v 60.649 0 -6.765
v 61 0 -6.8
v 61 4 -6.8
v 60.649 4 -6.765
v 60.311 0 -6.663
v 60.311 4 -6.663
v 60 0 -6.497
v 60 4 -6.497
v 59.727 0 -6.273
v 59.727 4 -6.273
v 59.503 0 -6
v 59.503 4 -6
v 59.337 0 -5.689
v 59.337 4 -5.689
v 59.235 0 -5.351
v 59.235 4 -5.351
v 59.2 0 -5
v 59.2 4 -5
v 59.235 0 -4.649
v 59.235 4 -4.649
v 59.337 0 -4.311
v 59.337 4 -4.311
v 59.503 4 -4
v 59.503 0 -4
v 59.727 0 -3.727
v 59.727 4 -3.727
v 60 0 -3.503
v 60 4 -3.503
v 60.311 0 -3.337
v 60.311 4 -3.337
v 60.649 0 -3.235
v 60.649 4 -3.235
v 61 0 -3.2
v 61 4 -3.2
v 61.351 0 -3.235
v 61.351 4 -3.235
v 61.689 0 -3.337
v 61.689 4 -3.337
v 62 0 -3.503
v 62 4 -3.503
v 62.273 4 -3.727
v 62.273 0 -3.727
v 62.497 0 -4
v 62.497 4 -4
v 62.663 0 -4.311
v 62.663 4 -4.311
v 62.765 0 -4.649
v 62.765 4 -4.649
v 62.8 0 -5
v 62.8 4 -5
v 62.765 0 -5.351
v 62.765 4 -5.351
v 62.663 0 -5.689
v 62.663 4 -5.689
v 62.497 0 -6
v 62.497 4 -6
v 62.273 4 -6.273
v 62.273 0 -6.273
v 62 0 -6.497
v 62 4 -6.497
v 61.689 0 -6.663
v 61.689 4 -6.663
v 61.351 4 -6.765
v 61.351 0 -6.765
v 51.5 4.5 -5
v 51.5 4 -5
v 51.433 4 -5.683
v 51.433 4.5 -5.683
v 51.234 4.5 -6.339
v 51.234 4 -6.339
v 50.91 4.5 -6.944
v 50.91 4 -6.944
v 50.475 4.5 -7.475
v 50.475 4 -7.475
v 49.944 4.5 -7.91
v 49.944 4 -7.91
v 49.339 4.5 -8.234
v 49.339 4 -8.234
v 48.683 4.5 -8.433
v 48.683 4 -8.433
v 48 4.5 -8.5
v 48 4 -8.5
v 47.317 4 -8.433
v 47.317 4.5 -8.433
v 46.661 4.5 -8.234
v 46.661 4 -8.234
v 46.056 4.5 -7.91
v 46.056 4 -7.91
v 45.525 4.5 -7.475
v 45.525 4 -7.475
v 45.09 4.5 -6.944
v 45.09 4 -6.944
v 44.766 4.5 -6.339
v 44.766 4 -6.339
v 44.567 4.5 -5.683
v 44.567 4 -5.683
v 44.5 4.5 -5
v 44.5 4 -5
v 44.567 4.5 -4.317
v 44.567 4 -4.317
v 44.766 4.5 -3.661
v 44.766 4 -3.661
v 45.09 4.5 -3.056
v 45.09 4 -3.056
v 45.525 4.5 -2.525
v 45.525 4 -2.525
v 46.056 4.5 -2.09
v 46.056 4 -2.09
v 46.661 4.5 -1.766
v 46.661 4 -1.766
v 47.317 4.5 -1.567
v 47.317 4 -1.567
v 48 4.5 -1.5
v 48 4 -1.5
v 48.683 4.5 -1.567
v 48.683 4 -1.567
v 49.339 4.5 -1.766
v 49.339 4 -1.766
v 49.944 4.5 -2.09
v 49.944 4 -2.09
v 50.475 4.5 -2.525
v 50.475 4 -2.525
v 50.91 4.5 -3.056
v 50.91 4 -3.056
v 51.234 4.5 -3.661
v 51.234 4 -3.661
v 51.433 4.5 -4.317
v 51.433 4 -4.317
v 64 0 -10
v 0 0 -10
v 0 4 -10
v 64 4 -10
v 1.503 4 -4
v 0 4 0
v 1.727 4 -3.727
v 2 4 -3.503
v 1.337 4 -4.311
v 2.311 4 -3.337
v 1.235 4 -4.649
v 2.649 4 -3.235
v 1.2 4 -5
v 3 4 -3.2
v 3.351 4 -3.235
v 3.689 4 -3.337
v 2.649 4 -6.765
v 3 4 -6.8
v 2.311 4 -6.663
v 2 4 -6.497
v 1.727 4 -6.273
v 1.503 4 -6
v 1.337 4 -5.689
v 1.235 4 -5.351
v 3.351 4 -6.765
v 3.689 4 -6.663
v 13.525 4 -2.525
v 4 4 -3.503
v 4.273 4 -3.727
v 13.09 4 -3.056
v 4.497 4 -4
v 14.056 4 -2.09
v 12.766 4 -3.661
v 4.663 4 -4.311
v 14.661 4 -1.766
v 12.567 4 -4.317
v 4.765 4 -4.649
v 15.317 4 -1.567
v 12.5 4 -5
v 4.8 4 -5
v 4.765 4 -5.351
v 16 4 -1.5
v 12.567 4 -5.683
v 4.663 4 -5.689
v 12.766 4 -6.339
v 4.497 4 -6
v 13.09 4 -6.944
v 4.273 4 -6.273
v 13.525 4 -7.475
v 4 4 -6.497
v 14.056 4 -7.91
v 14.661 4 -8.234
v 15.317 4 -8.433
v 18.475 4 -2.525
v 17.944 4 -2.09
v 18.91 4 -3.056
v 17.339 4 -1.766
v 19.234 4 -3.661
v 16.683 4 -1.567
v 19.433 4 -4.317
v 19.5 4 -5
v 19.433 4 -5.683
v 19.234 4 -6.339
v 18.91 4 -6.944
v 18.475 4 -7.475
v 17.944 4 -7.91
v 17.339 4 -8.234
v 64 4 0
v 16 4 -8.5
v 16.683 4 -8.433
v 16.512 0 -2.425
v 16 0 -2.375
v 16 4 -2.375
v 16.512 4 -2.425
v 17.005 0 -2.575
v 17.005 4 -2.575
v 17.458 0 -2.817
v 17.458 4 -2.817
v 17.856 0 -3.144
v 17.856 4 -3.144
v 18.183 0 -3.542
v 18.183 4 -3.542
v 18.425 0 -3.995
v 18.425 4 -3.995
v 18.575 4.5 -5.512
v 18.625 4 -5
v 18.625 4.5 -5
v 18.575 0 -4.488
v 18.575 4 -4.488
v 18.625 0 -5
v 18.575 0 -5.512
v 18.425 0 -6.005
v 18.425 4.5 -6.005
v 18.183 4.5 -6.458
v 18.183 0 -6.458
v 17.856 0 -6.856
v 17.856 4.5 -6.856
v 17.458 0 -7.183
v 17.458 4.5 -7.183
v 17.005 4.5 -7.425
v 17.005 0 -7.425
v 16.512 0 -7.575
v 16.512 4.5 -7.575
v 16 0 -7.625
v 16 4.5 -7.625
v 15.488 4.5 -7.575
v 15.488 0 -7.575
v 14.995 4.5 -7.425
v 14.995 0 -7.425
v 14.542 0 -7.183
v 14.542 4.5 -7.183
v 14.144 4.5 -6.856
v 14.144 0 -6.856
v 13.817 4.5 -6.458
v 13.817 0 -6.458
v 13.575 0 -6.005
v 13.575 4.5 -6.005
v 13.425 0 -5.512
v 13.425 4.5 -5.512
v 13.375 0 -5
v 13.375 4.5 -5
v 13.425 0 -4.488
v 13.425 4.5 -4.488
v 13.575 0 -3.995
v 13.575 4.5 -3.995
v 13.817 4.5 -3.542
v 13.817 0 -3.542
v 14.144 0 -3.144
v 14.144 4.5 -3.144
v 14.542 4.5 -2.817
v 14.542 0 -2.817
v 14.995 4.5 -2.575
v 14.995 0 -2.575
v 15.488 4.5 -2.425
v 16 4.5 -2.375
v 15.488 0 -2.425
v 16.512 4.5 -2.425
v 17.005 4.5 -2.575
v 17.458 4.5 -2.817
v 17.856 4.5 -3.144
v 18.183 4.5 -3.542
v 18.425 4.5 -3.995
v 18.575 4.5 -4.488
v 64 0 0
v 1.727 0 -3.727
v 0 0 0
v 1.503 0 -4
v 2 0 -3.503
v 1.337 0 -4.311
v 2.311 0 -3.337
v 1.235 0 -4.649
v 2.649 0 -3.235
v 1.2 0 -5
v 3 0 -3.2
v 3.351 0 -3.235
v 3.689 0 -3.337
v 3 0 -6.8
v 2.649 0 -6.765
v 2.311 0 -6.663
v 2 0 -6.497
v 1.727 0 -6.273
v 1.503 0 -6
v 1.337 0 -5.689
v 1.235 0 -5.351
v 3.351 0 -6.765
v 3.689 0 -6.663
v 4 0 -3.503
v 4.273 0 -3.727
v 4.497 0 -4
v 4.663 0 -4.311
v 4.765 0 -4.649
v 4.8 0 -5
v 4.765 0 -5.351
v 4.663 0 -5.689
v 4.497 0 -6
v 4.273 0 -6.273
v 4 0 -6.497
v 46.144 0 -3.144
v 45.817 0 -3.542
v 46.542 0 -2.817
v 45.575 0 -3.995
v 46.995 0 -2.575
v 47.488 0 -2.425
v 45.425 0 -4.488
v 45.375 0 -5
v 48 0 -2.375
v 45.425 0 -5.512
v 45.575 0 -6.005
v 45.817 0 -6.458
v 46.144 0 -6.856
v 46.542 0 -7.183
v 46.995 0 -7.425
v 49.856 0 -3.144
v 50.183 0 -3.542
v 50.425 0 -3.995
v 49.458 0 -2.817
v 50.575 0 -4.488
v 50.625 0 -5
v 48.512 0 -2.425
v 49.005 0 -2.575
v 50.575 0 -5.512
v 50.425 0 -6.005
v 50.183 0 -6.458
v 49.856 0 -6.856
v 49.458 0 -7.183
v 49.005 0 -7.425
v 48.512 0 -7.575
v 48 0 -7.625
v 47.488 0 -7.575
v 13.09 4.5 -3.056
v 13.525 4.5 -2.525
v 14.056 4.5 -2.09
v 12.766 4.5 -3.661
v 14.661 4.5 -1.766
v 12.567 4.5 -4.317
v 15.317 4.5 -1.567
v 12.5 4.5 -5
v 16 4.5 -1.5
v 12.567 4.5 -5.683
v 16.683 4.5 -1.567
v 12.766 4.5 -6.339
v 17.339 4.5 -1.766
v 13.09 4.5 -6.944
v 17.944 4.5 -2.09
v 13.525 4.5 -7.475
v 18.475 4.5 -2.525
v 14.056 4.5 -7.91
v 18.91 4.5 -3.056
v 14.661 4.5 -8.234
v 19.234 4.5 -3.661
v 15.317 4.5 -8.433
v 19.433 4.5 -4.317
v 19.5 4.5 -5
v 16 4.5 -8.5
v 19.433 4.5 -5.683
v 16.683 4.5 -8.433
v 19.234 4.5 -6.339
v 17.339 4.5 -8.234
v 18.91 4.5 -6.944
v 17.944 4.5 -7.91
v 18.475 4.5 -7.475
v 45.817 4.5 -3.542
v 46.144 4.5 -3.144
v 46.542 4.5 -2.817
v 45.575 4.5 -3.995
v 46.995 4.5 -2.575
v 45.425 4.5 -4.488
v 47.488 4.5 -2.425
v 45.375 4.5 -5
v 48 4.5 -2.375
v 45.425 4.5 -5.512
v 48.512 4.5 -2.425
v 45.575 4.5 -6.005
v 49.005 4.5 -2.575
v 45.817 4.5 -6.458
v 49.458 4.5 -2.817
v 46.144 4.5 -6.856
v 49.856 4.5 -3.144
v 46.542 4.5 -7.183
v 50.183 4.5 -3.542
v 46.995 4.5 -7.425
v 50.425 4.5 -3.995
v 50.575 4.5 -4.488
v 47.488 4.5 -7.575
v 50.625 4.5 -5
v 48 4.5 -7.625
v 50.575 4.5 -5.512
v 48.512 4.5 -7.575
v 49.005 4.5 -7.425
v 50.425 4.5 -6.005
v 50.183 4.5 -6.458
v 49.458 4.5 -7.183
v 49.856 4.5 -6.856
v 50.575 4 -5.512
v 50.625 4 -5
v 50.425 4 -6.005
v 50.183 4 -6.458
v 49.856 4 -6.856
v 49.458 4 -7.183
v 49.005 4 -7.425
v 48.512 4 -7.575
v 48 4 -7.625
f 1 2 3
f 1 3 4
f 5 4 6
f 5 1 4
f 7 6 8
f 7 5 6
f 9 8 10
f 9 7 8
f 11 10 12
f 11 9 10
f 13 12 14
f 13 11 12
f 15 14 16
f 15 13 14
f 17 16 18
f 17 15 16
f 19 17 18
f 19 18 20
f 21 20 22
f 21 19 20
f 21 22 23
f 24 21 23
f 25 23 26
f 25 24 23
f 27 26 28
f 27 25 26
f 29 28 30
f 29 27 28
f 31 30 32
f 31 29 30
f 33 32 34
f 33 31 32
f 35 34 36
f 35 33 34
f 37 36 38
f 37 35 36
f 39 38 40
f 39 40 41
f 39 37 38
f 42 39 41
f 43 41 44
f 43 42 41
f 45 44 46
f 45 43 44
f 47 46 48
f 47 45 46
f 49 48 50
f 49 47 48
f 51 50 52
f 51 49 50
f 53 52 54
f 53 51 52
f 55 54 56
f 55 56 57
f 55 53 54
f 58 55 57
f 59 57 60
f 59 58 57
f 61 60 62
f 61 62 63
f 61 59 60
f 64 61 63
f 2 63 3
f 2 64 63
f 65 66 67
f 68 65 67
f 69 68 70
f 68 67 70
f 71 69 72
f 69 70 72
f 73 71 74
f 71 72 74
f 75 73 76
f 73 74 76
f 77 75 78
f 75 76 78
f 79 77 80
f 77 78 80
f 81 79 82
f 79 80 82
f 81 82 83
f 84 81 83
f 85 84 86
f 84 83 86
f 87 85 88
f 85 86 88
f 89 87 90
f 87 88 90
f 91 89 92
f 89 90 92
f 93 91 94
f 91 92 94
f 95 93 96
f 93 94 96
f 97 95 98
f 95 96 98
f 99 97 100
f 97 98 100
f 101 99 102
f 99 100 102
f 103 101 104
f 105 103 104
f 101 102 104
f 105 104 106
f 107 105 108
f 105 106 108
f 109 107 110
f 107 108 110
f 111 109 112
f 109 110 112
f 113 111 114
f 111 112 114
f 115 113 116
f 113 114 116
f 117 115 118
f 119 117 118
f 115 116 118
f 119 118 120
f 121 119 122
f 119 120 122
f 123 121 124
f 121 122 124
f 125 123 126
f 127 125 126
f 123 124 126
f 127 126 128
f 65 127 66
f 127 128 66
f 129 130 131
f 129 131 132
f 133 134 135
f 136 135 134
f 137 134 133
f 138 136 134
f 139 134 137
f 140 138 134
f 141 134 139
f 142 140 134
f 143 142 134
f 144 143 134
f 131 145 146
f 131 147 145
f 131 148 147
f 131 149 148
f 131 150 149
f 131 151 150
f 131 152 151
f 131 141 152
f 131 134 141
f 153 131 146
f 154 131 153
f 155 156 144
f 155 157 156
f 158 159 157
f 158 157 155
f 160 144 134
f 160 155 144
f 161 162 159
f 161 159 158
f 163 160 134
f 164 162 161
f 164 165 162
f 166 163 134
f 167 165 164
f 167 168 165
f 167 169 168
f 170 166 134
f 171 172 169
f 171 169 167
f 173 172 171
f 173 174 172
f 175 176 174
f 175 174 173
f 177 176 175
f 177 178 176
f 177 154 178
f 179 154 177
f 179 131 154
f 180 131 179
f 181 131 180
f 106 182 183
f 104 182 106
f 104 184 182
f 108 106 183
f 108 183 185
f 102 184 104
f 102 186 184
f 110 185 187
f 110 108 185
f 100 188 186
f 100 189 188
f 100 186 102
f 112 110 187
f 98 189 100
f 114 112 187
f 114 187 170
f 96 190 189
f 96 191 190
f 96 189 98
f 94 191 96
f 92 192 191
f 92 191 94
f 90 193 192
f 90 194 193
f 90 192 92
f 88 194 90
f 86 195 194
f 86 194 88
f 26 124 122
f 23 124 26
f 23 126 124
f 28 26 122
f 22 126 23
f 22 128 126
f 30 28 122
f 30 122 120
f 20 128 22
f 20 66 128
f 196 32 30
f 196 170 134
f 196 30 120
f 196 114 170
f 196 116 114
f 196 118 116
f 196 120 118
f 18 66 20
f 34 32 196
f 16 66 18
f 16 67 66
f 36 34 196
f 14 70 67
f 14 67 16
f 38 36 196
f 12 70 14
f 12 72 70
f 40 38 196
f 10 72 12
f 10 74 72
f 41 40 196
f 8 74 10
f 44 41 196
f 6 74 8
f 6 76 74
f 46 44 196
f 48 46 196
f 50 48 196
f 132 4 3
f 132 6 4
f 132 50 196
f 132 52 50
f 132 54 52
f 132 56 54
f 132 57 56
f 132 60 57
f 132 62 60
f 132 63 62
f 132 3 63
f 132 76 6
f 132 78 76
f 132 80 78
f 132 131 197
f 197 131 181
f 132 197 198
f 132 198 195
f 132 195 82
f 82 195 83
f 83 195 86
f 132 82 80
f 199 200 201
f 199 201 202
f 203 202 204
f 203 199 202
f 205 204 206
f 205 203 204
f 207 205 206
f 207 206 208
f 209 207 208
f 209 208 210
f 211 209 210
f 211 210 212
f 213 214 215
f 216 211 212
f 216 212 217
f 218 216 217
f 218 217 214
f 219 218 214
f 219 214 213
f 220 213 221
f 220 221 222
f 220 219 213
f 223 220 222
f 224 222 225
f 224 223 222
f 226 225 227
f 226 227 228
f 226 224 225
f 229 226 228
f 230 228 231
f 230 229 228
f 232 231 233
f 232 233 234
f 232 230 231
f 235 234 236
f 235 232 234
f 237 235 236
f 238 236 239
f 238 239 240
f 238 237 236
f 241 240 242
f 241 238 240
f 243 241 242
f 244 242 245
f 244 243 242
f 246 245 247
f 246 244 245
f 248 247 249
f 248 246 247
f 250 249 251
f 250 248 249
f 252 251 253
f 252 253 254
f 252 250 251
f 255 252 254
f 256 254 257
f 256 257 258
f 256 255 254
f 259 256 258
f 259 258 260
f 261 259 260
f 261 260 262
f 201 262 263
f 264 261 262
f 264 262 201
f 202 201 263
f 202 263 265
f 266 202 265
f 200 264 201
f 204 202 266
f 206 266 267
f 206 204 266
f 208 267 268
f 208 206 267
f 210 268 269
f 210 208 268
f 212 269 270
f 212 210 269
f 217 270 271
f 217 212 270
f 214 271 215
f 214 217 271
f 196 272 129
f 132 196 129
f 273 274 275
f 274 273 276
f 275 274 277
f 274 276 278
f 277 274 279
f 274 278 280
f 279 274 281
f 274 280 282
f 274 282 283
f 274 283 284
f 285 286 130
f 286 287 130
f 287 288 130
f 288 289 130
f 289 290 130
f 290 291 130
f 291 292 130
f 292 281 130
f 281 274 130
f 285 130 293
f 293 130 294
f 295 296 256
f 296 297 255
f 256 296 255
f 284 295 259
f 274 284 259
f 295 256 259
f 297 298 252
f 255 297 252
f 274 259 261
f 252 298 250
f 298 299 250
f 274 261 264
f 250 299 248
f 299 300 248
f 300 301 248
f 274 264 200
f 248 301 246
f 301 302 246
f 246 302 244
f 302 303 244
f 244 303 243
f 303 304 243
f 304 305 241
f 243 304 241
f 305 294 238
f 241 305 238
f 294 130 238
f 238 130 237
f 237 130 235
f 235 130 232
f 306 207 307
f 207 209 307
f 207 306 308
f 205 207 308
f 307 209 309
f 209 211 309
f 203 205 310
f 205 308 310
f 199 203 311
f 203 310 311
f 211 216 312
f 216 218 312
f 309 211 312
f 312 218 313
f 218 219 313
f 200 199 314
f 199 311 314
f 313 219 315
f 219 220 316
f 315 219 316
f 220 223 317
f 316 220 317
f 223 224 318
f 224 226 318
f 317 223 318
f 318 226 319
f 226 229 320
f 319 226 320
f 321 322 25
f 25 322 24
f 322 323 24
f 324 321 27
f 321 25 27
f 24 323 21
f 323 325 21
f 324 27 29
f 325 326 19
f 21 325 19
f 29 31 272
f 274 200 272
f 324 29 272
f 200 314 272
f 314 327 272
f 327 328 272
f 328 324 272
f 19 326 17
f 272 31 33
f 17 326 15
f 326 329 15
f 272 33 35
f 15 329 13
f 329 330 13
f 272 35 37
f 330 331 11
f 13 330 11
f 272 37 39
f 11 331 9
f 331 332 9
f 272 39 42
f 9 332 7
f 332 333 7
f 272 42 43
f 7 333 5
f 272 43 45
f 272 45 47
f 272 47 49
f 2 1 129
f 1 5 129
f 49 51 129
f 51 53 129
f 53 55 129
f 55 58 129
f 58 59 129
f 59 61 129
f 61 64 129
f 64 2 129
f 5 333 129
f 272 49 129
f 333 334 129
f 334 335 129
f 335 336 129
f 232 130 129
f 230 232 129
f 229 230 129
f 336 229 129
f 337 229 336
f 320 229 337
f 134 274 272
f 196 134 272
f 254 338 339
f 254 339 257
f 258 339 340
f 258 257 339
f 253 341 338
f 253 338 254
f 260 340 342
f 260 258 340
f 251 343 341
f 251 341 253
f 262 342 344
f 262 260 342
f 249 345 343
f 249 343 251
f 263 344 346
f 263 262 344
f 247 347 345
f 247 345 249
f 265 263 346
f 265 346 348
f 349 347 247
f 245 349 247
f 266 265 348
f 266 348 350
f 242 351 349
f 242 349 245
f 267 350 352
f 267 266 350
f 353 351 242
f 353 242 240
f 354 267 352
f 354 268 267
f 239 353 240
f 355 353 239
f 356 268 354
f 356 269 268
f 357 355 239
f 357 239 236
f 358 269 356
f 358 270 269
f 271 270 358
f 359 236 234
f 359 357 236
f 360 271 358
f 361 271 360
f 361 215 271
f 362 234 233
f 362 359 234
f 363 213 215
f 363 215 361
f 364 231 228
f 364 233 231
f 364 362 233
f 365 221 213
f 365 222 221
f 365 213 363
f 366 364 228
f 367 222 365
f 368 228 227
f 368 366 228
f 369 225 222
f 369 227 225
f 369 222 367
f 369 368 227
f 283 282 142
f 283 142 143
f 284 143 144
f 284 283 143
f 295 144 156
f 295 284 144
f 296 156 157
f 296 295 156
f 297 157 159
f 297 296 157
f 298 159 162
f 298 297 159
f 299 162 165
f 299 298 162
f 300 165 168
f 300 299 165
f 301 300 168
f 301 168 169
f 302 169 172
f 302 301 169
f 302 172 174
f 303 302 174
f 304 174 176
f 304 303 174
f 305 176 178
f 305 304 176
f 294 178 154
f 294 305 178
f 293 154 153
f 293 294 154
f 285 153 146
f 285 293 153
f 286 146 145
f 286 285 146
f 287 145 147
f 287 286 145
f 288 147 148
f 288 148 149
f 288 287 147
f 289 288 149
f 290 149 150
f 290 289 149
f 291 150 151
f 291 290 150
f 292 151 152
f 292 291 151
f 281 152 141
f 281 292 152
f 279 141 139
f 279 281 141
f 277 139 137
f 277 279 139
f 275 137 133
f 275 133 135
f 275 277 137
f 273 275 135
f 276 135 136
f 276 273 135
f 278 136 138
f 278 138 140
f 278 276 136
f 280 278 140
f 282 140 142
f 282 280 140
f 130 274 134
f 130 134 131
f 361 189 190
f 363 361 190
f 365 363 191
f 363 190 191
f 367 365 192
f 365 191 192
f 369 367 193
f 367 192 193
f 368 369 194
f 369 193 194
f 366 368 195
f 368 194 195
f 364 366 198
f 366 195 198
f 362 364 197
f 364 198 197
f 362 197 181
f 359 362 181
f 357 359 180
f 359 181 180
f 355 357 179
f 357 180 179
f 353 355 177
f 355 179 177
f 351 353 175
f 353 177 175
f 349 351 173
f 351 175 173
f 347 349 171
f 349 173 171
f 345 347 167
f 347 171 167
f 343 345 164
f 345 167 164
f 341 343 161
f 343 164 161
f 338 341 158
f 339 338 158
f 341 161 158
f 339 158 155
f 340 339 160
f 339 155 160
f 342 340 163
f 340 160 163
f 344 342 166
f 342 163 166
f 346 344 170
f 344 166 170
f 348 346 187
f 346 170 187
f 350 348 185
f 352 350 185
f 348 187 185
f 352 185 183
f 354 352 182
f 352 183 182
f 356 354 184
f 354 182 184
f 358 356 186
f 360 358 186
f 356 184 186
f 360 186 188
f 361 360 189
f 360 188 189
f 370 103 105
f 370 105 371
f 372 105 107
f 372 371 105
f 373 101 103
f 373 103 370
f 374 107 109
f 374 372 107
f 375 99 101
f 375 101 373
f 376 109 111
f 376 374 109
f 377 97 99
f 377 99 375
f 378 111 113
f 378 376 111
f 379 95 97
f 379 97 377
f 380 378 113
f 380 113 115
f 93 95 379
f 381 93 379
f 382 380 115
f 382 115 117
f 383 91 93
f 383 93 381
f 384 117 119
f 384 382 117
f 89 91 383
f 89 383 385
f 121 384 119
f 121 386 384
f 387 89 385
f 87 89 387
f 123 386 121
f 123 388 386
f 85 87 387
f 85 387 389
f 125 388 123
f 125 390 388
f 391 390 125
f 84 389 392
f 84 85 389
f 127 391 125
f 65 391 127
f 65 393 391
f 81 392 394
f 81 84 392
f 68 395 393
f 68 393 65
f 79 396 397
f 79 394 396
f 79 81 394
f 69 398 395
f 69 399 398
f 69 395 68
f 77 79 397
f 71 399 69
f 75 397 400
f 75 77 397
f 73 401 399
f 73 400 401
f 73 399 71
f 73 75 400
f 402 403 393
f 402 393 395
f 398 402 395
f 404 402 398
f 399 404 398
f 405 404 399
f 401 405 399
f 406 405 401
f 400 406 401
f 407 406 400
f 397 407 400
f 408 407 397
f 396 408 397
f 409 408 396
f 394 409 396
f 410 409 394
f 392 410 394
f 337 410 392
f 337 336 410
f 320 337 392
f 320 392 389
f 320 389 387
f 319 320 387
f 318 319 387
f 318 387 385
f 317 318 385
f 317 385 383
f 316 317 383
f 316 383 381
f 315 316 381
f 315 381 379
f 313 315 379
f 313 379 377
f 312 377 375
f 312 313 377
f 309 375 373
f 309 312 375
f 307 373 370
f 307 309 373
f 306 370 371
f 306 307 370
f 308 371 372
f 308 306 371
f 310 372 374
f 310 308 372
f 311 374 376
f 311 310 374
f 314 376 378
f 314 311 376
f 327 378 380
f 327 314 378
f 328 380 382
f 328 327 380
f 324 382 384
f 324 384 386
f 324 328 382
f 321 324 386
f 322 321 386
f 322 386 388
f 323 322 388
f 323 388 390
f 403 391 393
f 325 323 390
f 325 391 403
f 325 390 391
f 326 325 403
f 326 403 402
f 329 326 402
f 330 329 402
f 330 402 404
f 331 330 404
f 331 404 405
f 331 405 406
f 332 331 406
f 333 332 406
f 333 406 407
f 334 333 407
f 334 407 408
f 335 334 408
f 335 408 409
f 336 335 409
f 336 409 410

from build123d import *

# Parameters (mm, degrees)
SKETCH1_W                 = 64
SKETCH1_H                 = 10
SKETCH1_R                 = 1.8
SKETCH1_R_2               = 2.625
BOSS_EXTRUDE1_DEPTH       = 4
BOSS_EXTRUDE2_START       = 4
BOSS_EXTRUDE2_OUTLINE_R   = 3.5
BOSS_EXTRUDE2_OUTLINE_R_2 = 2.625
BOSS_EXTRUDE2_DEPTH       = 0.5


# Read off the part's stored shape, not the designer's step: Boss-Extrude2
with BuildPart() as part:
    # Sketch1 → Boss-Extrude1 (new body)
    with BuildSketch(Plane(origin=(0, 0, 0), x_dir=(1, 0, 0), z_dir=(0, 1, 0))):
        with Locations((32, 5)):
            Rectangle(SKETCH1_W, SKETCH1_H)
        with Locations(Location((3, 5, 0), (0, 0, 270))):
            Circle(SKETCH1_R, mode=Mode.SUBTRACT)
        with Locations(Location((16, 5, 0), (0, 0, 270))):
            Circle(SKETCH1_R_2, mode=Mode.SUBTRACT)
        with Locations(Location((61, 5, 0), (0, 0, 90))):
            Circle(SKETCH1_R, mode=Mode.SUBTRACT)
        with Locations(Location((48, 5, 0), (0, 0, 90))):
            Circle(SKETCH1_R_2, mode=Mode.SUBTRACT)
    extrude(amount=BOSS_EXTRUDE1_DEPTH)

    # Boss-Extrude2 outline → Boss-Extrude2 (add)
    # profile 1 of 2: a face of its own
    with BuildSketch(Plane(origin=(0, 0, 0), x_dir=(1, 0, 0), z_dir=(0, 1, 0)).offset(BOSS_EXTRUDE2_START)):
        with Locations((16, 5)):
            Circle(BOSS_EXTRUDE2_OUTLINE_R)
        with Locations((16, 5)):
            Circle(BOSS_EXTRUDE2_OUTLINE_R_2, mode=Mode.SUBTRACT)
    # profile 2 of 2: a face of its own
    with BuildSketch(Plane(origin=(0, 0, 0), x_dir=(1, 0, 0), z_dir=(0, 1, 0)).offset(BOSS_EXTRUDE2_START)):
        with Locations((48, 5)):
            Circle(BOSS_EXTRUDE2_OUTLINE_R)
        with Locations((48, 5)):
            Circle(BOSS_EXTRUDE2_OUTLINE_R_2, mode=Mode.SUBTRACT)
    extrude(amount=BOSS_EXTRUDE2_DEPTH)


solid = part.part
